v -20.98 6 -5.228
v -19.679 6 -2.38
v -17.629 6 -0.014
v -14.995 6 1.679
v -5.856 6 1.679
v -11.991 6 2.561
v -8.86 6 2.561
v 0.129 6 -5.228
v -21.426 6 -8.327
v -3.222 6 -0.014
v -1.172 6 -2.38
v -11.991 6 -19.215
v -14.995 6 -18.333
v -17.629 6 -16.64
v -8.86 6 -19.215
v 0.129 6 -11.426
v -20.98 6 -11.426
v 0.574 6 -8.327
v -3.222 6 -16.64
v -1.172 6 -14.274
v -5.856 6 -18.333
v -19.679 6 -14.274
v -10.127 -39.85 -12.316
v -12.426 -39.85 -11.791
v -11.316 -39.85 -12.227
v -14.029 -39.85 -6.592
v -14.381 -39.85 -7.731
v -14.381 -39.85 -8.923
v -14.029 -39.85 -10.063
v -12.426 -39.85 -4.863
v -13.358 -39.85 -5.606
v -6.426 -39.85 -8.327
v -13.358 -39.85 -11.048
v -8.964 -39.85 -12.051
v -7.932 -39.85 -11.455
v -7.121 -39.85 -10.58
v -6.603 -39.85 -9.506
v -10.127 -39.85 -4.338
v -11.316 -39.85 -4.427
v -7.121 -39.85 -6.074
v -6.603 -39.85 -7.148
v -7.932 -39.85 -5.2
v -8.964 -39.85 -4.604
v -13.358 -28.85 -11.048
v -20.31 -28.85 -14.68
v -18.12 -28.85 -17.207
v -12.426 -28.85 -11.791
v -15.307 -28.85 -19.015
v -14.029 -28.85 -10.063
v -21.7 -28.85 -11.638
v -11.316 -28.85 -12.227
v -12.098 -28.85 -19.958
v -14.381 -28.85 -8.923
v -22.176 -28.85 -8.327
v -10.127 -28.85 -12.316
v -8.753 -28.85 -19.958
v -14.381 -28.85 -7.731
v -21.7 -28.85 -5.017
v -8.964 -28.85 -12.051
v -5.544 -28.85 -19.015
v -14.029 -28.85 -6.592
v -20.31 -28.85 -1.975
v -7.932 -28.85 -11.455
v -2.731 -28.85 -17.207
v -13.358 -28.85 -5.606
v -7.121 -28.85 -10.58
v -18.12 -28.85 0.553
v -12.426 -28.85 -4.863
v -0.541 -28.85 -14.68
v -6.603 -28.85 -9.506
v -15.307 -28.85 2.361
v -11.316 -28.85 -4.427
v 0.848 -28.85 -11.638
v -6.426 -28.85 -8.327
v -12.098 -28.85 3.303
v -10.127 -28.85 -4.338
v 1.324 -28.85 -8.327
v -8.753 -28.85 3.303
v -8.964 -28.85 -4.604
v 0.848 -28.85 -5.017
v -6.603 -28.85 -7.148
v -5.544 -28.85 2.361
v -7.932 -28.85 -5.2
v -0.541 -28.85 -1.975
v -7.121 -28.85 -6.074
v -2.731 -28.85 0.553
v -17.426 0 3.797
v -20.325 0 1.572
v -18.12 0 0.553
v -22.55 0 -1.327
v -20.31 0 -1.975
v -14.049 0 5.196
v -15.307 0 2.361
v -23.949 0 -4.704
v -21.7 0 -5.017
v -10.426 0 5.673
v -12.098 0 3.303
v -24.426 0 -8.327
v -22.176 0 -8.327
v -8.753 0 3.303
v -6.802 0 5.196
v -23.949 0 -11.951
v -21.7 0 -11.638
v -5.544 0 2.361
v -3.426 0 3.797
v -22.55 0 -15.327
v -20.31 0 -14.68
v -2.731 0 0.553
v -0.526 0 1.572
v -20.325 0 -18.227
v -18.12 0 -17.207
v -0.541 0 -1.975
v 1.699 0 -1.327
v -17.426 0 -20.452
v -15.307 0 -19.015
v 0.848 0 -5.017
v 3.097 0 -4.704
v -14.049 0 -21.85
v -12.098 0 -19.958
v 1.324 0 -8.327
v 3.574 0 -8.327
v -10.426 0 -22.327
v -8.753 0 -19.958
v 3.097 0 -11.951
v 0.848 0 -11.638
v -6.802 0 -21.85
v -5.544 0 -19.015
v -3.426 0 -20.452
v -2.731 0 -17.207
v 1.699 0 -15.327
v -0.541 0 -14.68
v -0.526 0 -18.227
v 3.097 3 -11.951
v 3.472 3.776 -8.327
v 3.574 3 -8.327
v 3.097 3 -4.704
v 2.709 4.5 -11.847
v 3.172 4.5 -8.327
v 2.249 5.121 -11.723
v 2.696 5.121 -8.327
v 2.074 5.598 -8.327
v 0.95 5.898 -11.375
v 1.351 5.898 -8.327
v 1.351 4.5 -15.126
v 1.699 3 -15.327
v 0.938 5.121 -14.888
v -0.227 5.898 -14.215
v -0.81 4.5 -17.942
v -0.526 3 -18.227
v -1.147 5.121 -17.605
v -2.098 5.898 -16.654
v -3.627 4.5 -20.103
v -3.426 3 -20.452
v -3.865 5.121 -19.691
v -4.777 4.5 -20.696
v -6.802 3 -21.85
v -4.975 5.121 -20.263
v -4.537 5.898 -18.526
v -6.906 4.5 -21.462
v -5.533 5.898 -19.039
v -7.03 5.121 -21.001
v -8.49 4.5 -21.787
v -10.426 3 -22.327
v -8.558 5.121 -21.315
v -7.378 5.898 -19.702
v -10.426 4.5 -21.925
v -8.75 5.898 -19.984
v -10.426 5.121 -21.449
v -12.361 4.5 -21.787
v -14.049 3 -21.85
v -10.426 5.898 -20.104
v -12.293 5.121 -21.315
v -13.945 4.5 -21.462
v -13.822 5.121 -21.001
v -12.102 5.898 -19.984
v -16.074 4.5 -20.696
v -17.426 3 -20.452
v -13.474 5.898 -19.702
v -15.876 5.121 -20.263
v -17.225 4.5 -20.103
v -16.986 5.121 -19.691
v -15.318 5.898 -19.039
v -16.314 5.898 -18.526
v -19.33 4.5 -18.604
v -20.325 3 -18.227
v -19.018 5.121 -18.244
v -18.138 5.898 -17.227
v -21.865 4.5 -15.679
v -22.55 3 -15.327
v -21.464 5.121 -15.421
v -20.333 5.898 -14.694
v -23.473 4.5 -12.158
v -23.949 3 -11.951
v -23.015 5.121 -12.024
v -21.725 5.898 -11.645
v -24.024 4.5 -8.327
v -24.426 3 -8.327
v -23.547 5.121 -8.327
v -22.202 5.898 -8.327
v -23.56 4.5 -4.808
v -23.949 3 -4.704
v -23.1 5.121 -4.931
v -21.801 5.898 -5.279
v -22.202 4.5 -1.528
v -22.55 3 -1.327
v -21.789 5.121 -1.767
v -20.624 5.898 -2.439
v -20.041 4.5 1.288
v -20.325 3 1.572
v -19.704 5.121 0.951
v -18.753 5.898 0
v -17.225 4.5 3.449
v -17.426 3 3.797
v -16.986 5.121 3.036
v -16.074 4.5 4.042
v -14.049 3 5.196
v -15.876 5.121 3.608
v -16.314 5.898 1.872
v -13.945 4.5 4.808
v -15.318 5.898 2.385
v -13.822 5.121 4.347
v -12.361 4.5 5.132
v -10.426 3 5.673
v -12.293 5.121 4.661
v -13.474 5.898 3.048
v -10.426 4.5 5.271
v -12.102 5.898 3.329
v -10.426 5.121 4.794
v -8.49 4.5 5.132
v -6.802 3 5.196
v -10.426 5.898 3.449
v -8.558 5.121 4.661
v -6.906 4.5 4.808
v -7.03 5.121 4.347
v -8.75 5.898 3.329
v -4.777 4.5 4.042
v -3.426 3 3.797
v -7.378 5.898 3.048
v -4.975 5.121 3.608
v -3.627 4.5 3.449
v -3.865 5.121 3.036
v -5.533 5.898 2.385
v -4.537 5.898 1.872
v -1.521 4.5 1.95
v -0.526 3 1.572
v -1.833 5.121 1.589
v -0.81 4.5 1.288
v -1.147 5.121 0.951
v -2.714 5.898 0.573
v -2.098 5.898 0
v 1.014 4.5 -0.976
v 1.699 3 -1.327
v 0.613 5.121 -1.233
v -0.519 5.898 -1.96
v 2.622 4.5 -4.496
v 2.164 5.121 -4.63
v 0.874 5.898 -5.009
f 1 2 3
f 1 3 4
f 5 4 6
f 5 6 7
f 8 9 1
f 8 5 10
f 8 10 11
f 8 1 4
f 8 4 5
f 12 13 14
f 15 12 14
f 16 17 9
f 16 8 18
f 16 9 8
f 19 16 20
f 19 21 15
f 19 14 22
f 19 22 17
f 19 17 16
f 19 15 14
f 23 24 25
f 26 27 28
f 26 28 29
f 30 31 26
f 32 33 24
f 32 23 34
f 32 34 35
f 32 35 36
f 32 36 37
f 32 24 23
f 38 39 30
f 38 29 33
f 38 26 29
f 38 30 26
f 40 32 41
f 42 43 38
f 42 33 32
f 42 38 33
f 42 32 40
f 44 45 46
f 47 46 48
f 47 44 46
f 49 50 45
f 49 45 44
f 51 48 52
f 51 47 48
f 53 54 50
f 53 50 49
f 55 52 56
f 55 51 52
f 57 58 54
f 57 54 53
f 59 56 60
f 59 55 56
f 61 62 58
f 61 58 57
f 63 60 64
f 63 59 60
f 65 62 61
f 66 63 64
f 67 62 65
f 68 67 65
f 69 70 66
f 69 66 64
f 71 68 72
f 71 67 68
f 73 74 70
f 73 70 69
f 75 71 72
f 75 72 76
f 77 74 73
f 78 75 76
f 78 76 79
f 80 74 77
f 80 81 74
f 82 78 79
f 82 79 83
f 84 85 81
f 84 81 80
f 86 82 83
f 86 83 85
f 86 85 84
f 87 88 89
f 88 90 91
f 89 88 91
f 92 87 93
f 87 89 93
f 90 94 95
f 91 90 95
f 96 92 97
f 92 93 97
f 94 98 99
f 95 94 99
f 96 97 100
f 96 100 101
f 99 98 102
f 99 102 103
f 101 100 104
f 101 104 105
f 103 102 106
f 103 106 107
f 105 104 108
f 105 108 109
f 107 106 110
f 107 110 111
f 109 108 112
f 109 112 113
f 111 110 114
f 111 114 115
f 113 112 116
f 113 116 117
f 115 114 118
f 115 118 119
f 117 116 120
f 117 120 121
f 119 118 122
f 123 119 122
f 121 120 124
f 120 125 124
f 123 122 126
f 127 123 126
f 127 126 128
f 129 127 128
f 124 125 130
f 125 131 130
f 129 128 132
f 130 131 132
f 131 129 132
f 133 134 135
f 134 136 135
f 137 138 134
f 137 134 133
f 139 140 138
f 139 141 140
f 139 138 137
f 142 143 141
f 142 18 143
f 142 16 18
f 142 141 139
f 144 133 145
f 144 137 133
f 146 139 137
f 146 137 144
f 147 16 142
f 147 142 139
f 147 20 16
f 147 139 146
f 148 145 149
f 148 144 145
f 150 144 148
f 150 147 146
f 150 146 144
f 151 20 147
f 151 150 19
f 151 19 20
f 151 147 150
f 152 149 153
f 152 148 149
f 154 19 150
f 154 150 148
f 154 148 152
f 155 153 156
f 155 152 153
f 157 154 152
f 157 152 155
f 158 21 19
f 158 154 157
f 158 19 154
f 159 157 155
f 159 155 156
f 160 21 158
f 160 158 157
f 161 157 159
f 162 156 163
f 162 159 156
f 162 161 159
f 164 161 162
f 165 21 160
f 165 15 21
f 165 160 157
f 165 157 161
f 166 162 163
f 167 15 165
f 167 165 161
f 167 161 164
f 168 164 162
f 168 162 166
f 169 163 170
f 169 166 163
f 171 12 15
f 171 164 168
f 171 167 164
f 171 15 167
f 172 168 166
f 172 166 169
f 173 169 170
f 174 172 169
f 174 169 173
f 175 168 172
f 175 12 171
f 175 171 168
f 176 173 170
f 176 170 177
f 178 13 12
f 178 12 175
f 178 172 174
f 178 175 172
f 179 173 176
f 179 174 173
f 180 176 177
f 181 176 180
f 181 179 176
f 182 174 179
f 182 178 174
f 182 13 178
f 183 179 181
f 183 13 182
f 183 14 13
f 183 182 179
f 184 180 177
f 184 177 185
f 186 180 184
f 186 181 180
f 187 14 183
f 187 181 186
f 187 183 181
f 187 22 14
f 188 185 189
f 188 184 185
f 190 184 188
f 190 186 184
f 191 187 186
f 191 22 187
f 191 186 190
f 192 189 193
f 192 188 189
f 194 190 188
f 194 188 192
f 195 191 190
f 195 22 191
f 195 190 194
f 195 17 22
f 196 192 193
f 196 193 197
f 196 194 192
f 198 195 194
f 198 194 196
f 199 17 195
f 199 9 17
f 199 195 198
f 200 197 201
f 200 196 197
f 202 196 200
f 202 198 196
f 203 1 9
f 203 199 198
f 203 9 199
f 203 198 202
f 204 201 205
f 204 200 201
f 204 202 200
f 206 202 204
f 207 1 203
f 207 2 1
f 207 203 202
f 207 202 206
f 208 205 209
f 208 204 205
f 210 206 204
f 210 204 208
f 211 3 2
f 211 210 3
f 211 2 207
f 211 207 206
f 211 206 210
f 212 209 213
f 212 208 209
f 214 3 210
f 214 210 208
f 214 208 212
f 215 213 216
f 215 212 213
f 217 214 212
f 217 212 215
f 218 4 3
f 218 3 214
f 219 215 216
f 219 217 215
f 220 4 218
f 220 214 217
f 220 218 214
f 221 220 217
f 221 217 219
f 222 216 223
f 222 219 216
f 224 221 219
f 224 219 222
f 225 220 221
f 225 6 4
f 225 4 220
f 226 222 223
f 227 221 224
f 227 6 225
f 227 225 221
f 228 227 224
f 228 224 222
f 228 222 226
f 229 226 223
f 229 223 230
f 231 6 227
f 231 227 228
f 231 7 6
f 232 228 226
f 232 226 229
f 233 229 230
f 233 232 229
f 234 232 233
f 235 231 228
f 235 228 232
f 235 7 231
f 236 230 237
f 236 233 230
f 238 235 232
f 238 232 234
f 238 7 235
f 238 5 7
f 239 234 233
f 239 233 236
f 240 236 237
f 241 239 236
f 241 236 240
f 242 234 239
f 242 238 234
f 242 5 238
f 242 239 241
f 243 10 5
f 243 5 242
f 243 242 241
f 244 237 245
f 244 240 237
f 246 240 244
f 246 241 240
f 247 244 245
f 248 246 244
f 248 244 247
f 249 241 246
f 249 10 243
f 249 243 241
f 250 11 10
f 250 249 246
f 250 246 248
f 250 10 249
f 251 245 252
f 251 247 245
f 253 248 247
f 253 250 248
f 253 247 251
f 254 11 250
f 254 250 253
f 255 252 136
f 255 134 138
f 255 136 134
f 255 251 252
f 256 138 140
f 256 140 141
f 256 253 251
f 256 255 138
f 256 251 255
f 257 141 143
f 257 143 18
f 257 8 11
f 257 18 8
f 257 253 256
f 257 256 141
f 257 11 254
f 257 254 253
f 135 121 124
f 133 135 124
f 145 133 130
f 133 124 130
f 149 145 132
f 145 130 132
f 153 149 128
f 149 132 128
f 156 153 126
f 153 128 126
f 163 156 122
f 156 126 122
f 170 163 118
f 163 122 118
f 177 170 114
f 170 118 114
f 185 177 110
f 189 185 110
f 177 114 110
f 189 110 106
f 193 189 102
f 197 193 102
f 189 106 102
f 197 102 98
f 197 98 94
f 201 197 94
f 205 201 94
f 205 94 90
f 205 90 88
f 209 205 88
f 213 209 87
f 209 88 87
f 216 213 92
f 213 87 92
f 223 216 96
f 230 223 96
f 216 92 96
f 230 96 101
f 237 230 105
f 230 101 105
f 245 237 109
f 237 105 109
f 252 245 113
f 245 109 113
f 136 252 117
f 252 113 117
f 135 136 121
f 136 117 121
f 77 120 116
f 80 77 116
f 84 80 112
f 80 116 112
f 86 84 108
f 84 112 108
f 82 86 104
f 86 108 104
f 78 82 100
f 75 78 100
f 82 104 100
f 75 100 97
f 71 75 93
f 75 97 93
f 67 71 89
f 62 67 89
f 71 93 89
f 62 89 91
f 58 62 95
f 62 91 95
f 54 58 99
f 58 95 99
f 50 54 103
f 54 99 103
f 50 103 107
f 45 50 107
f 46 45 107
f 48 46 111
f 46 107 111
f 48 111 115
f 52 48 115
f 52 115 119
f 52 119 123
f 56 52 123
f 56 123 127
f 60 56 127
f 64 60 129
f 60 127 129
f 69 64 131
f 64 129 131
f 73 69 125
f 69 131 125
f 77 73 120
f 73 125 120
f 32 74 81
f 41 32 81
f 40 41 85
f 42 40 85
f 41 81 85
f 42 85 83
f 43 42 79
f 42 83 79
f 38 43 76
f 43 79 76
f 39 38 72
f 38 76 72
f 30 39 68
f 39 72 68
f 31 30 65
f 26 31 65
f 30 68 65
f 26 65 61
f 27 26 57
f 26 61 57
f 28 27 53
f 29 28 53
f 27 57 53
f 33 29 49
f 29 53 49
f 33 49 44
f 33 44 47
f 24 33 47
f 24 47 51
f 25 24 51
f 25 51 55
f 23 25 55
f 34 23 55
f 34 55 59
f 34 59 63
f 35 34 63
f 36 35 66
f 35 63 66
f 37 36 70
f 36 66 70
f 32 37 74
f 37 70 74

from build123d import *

# Parameters (mm, degrees)
SKETCH1_R           = 14
BOSS_EXTRUDE1_DEPTH = 6
SKETCH2_R           = 11.75
BOSS_EXTRUDE2_DEPTH = 28.85
FILLET1_R           = 3
SKETCH3_R           = 4
BOSS_EXTRUDE3_DEPTH = 11


with BuildPart() as part:
    # Sketch1 → Boss-Extrude1 (new body)
    with BuildSketch(Plane(origin=(0, 0, 0), x_dir=(1, 0, 0), z_dir=(0, 1, 0))):
        with Locations((-10.425597089, 8.327180584)):
            Circle(SKETCH1_R)
    extrude(amount=BOSS_EXTRUDE1_DEPTH)

    # Sketch2 → Boss-Extrude2 (add)
    with BuildSketch(Plane.XZ):
        with Locations((-10.425597089, -8.327180584)):
            Circle(SKETCH2_R)
    extrude(amount=BOSS_EXTRUDE2_DEPTH)

    # Fillet1
    fillet1_edges = [part.edges().sort_by_distance(p)[0] for p in [
        (-24.425597089, 6, -8.327180584),
    ]]
    fillet(fillet1_edges, radius=FILLET1_R)

    # Sketch3 → Boss-Extrude3 (add)
    with BuildSketch(Plane.XZ.offset(28.85)):
        with Locations((-10.425597089, -8.327180584)):
            Circle(SKETCH3_R)
    extrude(amount=BOSS_EXTRUDE3_DEPTH)


solid = part.part
